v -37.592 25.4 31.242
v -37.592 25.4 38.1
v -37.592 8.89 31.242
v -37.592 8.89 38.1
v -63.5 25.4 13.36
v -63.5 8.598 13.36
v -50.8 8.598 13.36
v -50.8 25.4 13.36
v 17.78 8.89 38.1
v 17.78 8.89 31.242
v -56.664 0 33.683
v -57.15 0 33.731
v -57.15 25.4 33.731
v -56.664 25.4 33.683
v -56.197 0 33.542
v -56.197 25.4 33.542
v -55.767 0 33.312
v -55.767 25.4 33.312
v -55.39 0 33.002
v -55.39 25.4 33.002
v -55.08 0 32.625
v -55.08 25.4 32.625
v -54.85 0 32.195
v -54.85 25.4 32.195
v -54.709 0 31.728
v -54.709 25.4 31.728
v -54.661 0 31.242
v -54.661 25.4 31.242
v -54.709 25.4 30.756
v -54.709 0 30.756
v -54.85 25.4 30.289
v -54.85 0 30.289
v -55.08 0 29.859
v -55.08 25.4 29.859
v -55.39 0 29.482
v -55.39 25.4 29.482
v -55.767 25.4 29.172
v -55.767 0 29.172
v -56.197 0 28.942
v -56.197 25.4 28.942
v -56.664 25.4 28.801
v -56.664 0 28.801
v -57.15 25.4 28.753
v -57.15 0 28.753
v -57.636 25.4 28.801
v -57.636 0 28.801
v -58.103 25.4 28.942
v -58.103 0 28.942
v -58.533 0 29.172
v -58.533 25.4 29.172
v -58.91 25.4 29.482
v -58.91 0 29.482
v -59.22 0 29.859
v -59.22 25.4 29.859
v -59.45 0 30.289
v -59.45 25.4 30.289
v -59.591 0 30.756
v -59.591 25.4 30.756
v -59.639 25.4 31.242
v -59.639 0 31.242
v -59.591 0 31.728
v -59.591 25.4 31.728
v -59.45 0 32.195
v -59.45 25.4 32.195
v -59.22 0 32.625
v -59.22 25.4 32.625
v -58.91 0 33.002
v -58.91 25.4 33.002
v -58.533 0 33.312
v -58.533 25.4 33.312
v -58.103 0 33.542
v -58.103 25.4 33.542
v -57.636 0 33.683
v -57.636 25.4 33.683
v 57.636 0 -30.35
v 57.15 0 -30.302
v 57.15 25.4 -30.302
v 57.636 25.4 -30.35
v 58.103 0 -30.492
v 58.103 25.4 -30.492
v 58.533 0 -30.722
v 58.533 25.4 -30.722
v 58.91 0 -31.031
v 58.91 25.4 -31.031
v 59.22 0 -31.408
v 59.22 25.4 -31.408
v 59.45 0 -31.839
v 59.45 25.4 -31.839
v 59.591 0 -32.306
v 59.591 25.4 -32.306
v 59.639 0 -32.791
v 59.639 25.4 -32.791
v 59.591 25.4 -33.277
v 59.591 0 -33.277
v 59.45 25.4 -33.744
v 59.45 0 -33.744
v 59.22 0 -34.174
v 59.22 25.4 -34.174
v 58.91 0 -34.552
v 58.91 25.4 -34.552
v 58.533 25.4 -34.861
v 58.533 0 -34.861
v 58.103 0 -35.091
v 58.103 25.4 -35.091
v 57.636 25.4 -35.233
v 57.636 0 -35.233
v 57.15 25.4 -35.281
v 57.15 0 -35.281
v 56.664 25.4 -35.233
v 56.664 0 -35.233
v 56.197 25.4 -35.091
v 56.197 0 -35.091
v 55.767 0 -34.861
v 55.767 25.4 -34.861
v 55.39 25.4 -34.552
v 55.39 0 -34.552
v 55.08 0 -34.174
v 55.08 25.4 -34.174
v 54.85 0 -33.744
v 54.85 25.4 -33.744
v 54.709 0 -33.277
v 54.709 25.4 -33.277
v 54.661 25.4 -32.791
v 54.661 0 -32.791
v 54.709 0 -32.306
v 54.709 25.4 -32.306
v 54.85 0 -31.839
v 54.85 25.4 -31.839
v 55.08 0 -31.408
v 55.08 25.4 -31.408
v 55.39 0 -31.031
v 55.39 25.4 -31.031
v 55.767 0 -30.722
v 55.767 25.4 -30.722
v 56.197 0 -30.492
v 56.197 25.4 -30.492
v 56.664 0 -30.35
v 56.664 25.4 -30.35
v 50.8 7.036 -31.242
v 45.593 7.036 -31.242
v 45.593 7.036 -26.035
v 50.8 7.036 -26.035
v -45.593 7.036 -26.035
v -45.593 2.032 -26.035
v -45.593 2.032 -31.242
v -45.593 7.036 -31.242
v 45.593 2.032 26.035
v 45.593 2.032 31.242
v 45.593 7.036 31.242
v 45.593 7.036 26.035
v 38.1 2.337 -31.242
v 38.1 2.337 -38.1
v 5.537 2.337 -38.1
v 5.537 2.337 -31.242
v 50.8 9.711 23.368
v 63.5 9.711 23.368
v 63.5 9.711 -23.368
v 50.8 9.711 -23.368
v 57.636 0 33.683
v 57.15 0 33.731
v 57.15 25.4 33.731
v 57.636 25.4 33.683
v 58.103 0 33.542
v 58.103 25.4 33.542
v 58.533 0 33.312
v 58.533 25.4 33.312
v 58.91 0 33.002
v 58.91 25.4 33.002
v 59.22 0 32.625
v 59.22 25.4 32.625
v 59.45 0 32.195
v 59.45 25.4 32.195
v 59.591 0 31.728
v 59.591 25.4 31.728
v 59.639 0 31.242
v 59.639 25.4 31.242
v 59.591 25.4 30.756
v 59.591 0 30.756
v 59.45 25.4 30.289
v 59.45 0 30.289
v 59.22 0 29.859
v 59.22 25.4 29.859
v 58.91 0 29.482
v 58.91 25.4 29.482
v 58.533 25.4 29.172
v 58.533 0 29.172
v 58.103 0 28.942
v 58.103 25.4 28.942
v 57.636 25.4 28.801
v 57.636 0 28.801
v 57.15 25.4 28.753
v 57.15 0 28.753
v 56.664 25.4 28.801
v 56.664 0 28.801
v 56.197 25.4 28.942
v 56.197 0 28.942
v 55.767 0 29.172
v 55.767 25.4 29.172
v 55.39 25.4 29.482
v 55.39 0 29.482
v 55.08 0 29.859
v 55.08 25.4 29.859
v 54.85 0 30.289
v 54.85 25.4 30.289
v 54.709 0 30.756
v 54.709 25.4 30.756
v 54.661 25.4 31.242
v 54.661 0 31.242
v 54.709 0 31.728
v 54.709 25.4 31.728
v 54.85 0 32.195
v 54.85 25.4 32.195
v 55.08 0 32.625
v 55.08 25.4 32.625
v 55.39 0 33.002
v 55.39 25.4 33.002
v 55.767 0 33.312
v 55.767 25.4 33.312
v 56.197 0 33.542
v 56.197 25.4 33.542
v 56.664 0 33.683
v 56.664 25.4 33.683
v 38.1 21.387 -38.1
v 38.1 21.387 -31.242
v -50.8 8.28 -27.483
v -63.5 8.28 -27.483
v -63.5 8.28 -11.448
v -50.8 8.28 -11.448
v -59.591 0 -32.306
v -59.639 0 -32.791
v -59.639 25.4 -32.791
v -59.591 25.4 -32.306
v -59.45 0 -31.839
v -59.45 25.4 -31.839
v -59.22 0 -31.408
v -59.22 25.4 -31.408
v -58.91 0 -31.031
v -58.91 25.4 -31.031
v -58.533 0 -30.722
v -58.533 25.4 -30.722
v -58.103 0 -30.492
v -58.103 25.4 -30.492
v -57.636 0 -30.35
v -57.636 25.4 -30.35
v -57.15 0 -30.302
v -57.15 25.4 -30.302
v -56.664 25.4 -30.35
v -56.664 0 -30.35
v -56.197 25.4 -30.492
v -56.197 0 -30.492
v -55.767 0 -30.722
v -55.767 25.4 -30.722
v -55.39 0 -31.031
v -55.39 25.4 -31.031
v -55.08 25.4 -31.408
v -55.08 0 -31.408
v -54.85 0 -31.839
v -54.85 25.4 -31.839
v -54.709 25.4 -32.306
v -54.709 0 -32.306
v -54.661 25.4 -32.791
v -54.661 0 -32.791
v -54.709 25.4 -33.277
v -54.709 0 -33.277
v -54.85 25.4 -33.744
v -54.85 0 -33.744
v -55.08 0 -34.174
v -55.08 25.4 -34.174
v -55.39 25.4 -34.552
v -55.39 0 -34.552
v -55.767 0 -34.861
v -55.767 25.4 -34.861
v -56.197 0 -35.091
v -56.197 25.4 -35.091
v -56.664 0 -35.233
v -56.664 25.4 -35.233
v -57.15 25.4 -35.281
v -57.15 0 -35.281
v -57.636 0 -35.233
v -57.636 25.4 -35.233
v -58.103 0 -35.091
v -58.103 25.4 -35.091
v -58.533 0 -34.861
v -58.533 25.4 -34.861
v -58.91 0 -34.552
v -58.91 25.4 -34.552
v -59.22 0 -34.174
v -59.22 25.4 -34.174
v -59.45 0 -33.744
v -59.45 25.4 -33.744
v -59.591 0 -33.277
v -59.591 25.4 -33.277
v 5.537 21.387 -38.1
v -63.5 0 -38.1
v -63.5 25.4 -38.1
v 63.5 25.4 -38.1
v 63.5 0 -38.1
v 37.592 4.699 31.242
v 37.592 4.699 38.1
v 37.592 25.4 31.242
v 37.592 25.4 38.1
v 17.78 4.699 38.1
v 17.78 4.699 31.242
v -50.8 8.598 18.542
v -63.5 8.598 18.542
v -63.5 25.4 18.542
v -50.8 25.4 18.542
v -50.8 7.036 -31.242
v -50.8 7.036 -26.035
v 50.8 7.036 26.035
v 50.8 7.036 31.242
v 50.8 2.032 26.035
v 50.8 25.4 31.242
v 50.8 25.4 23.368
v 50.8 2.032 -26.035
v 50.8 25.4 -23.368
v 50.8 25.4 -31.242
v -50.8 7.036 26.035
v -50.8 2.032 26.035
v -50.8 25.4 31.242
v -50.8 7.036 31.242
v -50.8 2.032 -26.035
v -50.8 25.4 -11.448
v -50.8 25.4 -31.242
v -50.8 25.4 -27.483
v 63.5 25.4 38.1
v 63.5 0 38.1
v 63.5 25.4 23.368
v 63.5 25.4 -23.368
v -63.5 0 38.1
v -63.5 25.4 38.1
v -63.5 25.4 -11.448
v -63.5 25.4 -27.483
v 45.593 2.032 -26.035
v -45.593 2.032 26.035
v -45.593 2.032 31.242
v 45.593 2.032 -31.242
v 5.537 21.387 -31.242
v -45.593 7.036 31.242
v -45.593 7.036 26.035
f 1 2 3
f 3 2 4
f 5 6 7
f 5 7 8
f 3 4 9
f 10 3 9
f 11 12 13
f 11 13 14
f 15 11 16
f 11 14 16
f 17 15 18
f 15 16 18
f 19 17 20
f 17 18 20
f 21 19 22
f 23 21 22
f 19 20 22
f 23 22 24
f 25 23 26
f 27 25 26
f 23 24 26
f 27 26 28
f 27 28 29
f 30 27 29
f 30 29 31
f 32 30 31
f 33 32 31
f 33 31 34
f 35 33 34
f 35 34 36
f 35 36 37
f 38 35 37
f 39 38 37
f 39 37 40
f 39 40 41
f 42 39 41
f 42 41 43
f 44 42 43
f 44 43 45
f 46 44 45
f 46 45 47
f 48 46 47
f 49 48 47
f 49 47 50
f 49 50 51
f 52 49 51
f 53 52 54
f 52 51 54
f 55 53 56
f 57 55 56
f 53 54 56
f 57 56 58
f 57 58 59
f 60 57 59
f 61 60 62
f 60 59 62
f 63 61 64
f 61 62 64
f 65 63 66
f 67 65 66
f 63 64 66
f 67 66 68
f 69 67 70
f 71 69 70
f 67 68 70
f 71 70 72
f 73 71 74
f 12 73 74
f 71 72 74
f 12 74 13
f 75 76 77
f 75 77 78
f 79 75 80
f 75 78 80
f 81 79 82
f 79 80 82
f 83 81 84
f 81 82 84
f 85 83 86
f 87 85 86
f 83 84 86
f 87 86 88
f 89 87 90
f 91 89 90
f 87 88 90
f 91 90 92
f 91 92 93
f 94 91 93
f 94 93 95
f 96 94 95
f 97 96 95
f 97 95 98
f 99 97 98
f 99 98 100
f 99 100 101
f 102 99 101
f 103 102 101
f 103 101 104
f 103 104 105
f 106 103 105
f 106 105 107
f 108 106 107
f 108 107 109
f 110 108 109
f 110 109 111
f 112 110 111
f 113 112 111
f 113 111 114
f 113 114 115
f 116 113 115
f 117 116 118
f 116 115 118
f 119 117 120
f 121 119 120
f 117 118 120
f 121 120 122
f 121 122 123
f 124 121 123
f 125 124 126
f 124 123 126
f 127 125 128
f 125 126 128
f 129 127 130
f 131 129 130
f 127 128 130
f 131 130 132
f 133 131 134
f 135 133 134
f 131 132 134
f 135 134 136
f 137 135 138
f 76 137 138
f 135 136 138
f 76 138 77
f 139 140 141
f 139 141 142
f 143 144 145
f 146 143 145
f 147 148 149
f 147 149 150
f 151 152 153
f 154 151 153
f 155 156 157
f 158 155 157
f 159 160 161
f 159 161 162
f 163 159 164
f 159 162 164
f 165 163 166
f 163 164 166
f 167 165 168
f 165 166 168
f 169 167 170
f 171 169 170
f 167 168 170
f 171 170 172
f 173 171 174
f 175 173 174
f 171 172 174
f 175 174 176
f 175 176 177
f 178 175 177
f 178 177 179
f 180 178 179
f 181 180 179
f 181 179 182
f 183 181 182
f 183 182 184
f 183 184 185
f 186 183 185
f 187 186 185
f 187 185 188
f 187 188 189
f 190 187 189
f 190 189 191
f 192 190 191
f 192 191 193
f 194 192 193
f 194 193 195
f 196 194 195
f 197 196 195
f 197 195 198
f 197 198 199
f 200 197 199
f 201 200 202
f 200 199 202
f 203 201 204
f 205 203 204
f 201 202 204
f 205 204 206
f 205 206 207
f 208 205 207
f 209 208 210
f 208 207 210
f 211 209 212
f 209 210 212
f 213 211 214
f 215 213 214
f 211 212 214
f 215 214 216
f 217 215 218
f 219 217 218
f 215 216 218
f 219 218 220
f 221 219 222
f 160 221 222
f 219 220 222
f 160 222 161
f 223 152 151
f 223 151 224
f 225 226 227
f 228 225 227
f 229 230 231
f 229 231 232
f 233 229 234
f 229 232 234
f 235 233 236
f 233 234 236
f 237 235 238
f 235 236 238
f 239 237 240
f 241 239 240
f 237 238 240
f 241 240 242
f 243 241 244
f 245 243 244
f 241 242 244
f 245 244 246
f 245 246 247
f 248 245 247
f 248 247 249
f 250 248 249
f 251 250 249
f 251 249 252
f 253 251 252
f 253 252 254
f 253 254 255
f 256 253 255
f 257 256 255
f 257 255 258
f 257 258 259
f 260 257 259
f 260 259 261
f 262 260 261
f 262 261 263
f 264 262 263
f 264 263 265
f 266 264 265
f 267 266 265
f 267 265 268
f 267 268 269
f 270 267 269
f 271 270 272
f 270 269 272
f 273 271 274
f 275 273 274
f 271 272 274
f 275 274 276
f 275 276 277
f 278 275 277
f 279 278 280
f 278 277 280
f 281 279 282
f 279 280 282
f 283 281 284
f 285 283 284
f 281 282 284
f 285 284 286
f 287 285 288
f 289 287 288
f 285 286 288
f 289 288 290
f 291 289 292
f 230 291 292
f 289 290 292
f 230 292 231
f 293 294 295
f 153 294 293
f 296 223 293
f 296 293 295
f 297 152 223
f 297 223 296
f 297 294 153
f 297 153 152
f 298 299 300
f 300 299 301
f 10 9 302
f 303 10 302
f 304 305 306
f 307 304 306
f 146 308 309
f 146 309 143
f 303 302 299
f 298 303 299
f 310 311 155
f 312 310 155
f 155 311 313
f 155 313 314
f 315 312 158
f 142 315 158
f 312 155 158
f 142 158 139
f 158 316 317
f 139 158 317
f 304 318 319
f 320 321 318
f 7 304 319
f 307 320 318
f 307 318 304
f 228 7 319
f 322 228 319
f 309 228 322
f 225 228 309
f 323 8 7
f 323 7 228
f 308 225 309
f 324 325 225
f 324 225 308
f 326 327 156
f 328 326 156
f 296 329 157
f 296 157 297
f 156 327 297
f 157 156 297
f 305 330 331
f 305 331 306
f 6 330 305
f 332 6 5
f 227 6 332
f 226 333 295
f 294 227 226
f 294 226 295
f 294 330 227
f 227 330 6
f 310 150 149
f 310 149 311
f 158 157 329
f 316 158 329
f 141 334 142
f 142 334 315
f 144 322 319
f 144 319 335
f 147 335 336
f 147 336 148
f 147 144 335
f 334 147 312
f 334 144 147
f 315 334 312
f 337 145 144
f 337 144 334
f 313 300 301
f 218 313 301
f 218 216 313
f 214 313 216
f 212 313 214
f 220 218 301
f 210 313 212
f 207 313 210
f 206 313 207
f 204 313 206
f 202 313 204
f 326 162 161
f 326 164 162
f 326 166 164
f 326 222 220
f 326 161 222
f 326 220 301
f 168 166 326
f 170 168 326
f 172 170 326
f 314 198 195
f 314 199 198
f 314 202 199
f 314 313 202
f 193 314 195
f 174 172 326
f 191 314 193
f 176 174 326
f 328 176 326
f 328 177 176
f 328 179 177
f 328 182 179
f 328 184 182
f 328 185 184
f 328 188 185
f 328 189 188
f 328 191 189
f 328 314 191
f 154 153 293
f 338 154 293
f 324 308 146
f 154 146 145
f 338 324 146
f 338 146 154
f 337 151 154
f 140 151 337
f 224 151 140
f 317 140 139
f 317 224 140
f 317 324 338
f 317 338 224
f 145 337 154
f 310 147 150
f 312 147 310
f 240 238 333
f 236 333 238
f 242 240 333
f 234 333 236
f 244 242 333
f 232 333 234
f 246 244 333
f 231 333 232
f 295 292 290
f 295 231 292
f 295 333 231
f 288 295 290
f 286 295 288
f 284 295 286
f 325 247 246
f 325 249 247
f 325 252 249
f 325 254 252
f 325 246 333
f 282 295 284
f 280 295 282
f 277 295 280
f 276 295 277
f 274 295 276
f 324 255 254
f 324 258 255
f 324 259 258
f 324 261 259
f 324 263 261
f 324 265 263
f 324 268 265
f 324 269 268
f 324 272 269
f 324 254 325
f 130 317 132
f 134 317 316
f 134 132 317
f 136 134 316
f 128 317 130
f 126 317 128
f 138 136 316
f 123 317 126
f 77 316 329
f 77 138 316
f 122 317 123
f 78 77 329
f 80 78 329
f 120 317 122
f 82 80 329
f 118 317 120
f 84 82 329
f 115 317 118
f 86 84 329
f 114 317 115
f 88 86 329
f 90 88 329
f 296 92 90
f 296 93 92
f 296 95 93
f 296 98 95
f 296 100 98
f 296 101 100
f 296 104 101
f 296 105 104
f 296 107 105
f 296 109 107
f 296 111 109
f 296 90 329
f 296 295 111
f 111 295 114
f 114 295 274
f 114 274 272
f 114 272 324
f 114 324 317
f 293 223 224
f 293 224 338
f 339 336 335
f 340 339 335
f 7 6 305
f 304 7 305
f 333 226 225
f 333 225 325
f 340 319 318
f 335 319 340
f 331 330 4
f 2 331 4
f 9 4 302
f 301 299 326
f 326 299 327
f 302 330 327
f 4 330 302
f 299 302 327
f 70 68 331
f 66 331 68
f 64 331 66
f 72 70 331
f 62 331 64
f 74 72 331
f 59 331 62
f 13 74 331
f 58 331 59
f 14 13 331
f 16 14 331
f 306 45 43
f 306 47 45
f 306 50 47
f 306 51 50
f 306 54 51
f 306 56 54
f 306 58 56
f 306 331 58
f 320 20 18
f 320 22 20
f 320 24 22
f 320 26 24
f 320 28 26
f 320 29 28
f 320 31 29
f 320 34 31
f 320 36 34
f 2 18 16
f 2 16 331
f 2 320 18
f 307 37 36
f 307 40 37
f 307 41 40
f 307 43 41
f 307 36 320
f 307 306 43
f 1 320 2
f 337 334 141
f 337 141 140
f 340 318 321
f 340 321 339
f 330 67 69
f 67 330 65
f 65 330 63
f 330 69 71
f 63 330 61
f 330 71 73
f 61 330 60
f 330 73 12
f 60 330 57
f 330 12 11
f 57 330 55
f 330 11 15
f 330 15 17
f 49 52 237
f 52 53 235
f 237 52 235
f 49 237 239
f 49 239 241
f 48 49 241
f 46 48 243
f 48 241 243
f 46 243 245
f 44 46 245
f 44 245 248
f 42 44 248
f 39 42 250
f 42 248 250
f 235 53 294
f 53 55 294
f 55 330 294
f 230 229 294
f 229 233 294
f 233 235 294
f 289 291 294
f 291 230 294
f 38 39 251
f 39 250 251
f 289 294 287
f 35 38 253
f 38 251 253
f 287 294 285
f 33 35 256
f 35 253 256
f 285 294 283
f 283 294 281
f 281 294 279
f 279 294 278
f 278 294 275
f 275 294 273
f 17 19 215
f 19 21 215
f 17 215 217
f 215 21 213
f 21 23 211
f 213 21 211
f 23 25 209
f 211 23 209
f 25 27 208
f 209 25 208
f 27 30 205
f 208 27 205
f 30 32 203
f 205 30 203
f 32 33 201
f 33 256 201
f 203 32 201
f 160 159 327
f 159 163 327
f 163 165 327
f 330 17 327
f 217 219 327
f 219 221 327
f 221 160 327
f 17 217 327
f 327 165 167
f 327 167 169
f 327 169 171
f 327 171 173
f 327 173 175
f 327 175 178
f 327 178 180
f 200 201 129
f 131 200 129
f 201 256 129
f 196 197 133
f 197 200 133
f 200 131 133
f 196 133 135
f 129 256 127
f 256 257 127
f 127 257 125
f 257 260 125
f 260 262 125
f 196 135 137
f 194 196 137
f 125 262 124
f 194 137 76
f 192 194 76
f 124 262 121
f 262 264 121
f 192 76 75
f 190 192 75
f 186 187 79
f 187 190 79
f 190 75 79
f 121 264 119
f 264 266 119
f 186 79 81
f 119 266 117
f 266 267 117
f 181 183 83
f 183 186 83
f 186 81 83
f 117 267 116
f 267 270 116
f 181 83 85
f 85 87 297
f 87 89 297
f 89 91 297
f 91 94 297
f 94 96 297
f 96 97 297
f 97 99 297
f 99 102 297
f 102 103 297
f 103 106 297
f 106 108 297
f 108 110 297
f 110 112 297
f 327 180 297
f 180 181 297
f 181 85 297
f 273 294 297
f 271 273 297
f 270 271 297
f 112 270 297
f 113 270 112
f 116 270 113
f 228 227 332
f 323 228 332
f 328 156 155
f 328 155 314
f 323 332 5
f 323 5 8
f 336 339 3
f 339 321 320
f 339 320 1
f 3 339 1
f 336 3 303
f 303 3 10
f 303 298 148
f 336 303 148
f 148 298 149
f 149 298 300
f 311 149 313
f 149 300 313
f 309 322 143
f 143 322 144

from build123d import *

# Parameters (mm, degrees)
CROQUIS1_W              = 127
CROQUIS1_H              = 76.2
SALIENTE_EXTRUIR1_DEPTH = 25.4
CROQUIS2_W              = 101.6
CROQUIS2_H              = 62.484
CORTAR_EXTRUIR1_DEPTH   = 23.368
CORTAR_EXTRUIR2_REACH   = 137.003
CROQUIS3_W              = 46.736
CROQUIS3_H              = 15.688547189
CORTAR_EXTRUIR3_REACH   = 104.391
CORTAR_EXTRUIR4_REACH   = 137.003
CROQUIS5_W              = 5.1816
CROQUIS5_H              = 16.8021
CROQUIS5_W_2            = 16.03502
CROQUIS5_H_2            = 17.1196
CORTAR_EXTRUIR5_REACH   = 104.391
CROQUIS6_W              = 32.5628
CROQUIS6_H              = 19.05
CROQUIS7_R              = 2.4892
CORTAR_EXTRUIR6_DEPTH   = 79.288057838
CROQUIS8_W              = 5.207
CROQUIS8_H              = 5.207
SALIENTE_EXTRUIR2_DEPTH = 5.0038


with BuildPart() as part:
    # Croquis1 → Saliente-Extruir1 (new body)
    with BuildSketch(Plane(origin=(0, 0, 0), x_dir=(1, 0, 0), z_dir=(0, 1, 0))):
        Rectangle(CROQUIS1_W, CROQUIS1_H)
    extrude(amount=SALIENTE_EXTRUIR1_DEPTH)

    # Croquis2 → Cortar-Extruir1 (cut)
    with BuildSketch(Plane(origin=(0, 25.4, 0), x_dir=(1, 0, 0), z_dir=(0, 1, 0))):
        Rectangle(CROQUIS2_W, CROQUIS2_H)
    extrude(amount=-CORTAR_EXTRUIR1_DEPTH, mode=Mode.SUBTRACT)

    # Croquis3 → Cortar-Extruir2 (cut, up to next)
    with BuildSketch(Plane(origin=(63.5, 0, 0), x_dir=(0, 0, -1), z_dir=(1, 0, 0)), mode=Mode.PRIVATE) as cortar_extruir2_sk1:
        with Locations((0, 17.555726406)):
            Rectangle(CROQUIS3_W, CROQUIS3_H)
    cortar_extruir2_tool1 = extrude(cortar_extruir2_sk1.sketch, amount=-CORTAR_EXTRUIR2_REACH, mode=Mode.PRIVATE) & part.part
    add(cortar_extruir2_tool1.solids().sort_by_distance((63.5, 17.555726, 0))[0], mode=Mode.SUBTRACT)

    # Croquis4 → Cortar-Extruir3 (cut, up to next)
    with BuildSketch(Plane.XY.offset(38.1), mode=Mode.PRIVATE) as cortar_extruir3_sk1:
        Polygon((-37.592, 8.89), (17.78, 8.89), (17.78, 4.699), (37.592, 4.699), (37.592, 8.89), (37.592, 25.4), (-37.592, 25.4), align=None)
    cortar_extruir3_tool1 = extrude(cortar_extruir3_sk1.sketch, amount=-CORTAR_EXTRUIR3_REACH, mode=Mode.PRIVATE) & part.part
    add(cortar_extruir3_tool1.solids().sort_by_distance((1.735854, 16.496045, 38.1))[0], mode=Mode.SUBTRACT)

    # Croquis5 → Cortar-Extruir4 (cut, up to next)
    with BuildSketch(Plane.ZY.offset(63.5), mode=Mode.PRIVATE) as cortar_extruir4_sk1:
        with Locations((15.9512, 16.99895)):
            Rectangle(CROQUIS5_W, CROQUIS5_H)
    cortar_extruir4_tool1 = extrude(cortar_extruir4_sk1.sketch, amount=-CORTAR_EXTRUIR4_REACH, mode=Mode.PRIVATE) & part.part
    # Croquis5 → Cortar-Extruir4 (cut, up to next)
    with BuildSketch(Plane.ZY.offset(63.5), mode=Mode.PRIVATE) as cortar_extruir4_sk2:
        with Locations((-19.46529, 16.8402)):
            Rectangle(CROQUIS5_W_2, CROQUIS5_H_2)
    cortar_extruir4_tool2 = extrude(cortar_extruir4_sk2.sketch, amount=-CORTAR_EXTRUIR4_REACH, mode=Mode.PRIVATE) & part.part
    add(cortar_extruir4_tool1.solids().sort_by_distance((-63.5, 16.99895, 15.9512))[0], mode=Mode.SUBTRACT)
    add(cortar_extruir4_tool2.solids().sort_by_distance((-63.5, 16.8402, -19.46529))[0], mode=Mode.SUBTRACT)

    # Croquis6 → Cortar-Extruir5 (cut, up to next)
    with BuildSketch(Plane(origin=(0, 0, -38.1), x_dir=(-1, 0, 0), z_dir=(0, 0, -1)), mode=Mode.PRIVATE) as cortar_extruir5_sk1:
        with Locations((-21.8186, 11.8618)):
            Rectangle(CROQUIS6_W, CROQUIS6_H)
    cortar_extruir5_tool1 = extrude(cortar_extruir5_sk1.sketch, amount=-CORTAR_EXTRUIR5_REACH, mode=Mode.PRIVATE) & part.part
    add(cortar_extruir5_tool1.solids().sort_by_distance((21.8186, 11.8618, -38.1))[0], mode=Mode.SUBTRACT)

    # Croquis7 → Cortar-Extruir6 (cut, through all)
    with BuildSketch(Plane(origin=(0, 25.4, 0), x_dir=(1, 0, 0), z_dir=(0, 1, 0))):
        with BuildLine():
            ThreePointArc((-54.6608, 32.7914), (-57.15, 35.2806), (-59.6392, 32.7914))
            Line((-59.6392, 32.7914), (-54.6608, 32.7914))
        make_face()
        with BuildLine():
            Line((-54.6608, 32.7914), (-59.6392, 32.7914))
            ThreePointArc((-59.6392, 32.7914), (-57.15, 30.3022), (-54.6608, 32.7914))
        make_face()
        with Locations(Location((-57.15, -31.242, 0), (0, 0, 270))):
            Circle(CROQUIS7_R)
        with Locations(Location((57.15, 32.7914, 0), (0, 0, 270))):
            Circle(CROQUIS7_R)
        with Locations(Location((57.15, -31.242, 0), (0, 0, 270))):
            Circle(CROQUIS7_R)
    extrude(amount=-CORTAR_EXTRUIR6_DEPTH, mode=Mode.SUBTRACT)

    # Croquis8 → Saliente-Extruir2 (add)
    with BuildSketch(Plane(origin=(0, 2.032, 0), x_dir=(1, 0, 0), z_dir=(0, 1, 0))):
        with Locations((-48.1965, 28.6385)):
            Rectangle(CROQUIS8_W, CROQUIS8_H)
        with Locations((-48.1965, -28.6385)):
            Rectangle(CROQUIS8_W, CROQUIS8_H)
        with Locations((48.1965, -28.6385)):
            Rectangle(CROQUIS8_W, CROQUIS8_H)
        with Locations((48.1965, 28.6385)):
            Rectangle(CROQUIS8_W, CROQUIS8_H)
    extrude(amount=SALIENTE_EXTRUIR2_DEPTH)


solid = part.part
